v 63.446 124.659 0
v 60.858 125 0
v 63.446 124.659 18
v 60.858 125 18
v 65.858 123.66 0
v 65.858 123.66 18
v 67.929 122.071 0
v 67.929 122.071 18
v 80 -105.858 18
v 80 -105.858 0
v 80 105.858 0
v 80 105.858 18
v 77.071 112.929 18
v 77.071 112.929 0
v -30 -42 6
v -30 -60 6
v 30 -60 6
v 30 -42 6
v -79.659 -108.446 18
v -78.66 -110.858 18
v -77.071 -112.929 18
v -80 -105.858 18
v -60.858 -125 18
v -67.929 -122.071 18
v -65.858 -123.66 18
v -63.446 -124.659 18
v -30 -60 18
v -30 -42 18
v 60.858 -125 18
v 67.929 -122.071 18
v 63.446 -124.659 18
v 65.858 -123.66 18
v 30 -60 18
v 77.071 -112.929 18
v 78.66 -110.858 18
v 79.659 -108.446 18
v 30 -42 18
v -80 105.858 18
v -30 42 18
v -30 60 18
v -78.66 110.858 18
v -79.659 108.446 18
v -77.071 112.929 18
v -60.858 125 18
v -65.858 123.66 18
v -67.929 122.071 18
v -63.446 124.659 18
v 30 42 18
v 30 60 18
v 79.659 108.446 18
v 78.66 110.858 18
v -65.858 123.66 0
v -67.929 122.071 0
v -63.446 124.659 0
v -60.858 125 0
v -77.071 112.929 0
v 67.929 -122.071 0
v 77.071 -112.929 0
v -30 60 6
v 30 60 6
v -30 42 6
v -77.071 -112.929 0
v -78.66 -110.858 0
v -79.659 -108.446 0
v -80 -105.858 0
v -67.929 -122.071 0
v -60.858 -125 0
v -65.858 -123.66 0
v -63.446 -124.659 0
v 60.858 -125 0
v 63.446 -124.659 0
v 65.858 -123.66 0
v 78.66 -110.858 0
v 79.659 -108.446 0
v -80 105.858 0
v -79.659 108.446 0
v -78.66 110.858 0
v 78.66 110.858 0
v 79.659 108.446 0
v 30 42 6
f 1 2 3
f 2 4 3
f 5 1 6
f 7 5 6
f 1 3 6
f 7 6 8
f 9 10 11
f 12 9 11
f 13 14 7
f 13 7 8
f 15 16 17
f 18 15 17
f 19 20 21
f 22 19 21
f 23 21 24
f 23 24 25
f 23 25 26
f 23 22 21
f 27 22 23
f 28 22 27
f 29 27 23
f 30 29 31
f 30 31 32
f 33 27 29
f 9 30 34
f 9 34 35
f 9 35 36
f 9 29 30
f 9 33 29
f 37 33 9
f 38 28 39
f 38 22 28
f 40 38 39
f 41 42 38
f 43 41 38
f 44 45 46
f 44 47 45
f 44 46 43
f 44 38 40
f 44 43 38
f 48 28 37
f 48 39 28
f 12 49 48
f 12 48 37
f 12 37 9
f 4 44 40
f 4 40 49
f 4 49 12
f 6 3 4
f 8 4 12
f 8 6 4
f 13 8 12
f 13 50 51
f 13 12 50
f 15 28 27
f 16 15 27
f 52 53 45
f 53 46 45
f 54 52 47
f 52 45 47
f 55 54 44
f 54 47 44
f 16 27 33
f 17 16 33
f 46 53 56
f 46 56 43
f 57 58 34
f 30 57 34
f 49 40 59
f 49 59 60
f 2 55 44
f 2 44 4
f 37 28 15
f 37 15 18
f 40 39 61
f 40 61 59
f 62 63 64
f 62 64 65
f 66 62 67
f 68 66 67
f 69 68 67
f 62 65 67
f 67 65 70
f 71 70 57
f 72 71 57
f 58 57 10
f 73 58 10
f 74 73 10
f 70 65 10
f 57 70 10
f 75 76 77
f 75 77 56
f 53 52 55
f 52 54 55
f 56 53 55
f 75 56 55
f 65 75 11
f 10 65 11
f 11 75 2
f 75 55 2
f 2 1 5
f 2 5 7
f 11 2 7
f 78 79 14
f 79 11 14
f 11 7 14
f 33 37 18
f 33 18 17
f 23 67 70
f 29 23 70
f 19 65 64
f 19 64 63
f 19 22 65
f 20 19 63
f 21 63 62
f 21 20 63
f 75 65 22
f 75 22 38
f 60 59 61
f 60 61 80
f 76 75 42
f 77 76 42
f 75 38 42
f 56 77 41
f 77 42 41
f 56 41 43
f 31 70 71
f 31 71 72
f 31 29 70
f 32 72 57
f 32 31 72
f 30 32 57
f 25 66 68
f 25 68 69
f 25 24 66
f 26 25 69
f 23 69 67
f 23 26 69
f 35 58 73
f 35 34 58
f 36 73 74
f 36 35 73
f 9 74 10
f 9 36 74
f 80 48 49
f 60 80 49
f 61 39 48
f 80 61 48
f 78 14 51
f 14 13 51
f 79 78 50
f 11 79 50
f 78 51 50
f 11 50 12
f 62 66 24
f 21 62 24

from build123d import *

# Parameters (mm, degrees)
SKETCH_W     = 160
SKETCH_H     = 250
PAD_DEPTH    = 18
SKETCH001_W  = 60
SKETCH001_H  = 18
POCKET_DEPTH = 12
CHAMFER_SIZE = 15
FILLET_R     = 10


with BuildPart() as part:
    # Sketch → Pad (new body)
    with BuildSketch(Plane.XY):
        Rectangle(SKETCH_W, SKETCH_H)
    extrude(amount=PAD_DEPTH)

    # Sketch001 → Pocket (cut)
    with BuildSketch(Plane.XY.offset(18)):
        with Locations((0, 51)):
            Rectangle(SKETCH001_W, SKETCH001_H)
    pocket = extrude(amount=-POCKET_DEPTH, mode=Mode.SUBTRACT)

    # Mirrored: Pocket across Sketch001 H_Axis
    add(pocket.mirror(Plane(origin=(0, 0, 18), x_dir=(0, 0, 1), z_dir=(0, 1, 0))), mode=Mode.SUBTRACT)

    # Chamfer
    chamfer_edges = [part.edges().sort_by_distance(p)[0] for p in [
        (-80, -125, 9),
        (-80, 125, 9),
        (80, 125, 9),
        (80, -125, 9),
    ]]
    chamfer(chamfer_edges, length=CHAMFER_SIZE)

    # Fillet
    fillet_edges = [part.edges().sort_by_distance(p)[0] for p in [
        (65, -125, 9),
        (80, -110, 9),
        (-65, -125, 9),
        (-80, -110, 9),
        (-80, 110, 9),
        (-65, 125, 9),
        (65, 125, 9),
        (80, 110, 9),
    ]]
    fillet(fillet_edges, radius=FILLET_R)


solid = part.part
